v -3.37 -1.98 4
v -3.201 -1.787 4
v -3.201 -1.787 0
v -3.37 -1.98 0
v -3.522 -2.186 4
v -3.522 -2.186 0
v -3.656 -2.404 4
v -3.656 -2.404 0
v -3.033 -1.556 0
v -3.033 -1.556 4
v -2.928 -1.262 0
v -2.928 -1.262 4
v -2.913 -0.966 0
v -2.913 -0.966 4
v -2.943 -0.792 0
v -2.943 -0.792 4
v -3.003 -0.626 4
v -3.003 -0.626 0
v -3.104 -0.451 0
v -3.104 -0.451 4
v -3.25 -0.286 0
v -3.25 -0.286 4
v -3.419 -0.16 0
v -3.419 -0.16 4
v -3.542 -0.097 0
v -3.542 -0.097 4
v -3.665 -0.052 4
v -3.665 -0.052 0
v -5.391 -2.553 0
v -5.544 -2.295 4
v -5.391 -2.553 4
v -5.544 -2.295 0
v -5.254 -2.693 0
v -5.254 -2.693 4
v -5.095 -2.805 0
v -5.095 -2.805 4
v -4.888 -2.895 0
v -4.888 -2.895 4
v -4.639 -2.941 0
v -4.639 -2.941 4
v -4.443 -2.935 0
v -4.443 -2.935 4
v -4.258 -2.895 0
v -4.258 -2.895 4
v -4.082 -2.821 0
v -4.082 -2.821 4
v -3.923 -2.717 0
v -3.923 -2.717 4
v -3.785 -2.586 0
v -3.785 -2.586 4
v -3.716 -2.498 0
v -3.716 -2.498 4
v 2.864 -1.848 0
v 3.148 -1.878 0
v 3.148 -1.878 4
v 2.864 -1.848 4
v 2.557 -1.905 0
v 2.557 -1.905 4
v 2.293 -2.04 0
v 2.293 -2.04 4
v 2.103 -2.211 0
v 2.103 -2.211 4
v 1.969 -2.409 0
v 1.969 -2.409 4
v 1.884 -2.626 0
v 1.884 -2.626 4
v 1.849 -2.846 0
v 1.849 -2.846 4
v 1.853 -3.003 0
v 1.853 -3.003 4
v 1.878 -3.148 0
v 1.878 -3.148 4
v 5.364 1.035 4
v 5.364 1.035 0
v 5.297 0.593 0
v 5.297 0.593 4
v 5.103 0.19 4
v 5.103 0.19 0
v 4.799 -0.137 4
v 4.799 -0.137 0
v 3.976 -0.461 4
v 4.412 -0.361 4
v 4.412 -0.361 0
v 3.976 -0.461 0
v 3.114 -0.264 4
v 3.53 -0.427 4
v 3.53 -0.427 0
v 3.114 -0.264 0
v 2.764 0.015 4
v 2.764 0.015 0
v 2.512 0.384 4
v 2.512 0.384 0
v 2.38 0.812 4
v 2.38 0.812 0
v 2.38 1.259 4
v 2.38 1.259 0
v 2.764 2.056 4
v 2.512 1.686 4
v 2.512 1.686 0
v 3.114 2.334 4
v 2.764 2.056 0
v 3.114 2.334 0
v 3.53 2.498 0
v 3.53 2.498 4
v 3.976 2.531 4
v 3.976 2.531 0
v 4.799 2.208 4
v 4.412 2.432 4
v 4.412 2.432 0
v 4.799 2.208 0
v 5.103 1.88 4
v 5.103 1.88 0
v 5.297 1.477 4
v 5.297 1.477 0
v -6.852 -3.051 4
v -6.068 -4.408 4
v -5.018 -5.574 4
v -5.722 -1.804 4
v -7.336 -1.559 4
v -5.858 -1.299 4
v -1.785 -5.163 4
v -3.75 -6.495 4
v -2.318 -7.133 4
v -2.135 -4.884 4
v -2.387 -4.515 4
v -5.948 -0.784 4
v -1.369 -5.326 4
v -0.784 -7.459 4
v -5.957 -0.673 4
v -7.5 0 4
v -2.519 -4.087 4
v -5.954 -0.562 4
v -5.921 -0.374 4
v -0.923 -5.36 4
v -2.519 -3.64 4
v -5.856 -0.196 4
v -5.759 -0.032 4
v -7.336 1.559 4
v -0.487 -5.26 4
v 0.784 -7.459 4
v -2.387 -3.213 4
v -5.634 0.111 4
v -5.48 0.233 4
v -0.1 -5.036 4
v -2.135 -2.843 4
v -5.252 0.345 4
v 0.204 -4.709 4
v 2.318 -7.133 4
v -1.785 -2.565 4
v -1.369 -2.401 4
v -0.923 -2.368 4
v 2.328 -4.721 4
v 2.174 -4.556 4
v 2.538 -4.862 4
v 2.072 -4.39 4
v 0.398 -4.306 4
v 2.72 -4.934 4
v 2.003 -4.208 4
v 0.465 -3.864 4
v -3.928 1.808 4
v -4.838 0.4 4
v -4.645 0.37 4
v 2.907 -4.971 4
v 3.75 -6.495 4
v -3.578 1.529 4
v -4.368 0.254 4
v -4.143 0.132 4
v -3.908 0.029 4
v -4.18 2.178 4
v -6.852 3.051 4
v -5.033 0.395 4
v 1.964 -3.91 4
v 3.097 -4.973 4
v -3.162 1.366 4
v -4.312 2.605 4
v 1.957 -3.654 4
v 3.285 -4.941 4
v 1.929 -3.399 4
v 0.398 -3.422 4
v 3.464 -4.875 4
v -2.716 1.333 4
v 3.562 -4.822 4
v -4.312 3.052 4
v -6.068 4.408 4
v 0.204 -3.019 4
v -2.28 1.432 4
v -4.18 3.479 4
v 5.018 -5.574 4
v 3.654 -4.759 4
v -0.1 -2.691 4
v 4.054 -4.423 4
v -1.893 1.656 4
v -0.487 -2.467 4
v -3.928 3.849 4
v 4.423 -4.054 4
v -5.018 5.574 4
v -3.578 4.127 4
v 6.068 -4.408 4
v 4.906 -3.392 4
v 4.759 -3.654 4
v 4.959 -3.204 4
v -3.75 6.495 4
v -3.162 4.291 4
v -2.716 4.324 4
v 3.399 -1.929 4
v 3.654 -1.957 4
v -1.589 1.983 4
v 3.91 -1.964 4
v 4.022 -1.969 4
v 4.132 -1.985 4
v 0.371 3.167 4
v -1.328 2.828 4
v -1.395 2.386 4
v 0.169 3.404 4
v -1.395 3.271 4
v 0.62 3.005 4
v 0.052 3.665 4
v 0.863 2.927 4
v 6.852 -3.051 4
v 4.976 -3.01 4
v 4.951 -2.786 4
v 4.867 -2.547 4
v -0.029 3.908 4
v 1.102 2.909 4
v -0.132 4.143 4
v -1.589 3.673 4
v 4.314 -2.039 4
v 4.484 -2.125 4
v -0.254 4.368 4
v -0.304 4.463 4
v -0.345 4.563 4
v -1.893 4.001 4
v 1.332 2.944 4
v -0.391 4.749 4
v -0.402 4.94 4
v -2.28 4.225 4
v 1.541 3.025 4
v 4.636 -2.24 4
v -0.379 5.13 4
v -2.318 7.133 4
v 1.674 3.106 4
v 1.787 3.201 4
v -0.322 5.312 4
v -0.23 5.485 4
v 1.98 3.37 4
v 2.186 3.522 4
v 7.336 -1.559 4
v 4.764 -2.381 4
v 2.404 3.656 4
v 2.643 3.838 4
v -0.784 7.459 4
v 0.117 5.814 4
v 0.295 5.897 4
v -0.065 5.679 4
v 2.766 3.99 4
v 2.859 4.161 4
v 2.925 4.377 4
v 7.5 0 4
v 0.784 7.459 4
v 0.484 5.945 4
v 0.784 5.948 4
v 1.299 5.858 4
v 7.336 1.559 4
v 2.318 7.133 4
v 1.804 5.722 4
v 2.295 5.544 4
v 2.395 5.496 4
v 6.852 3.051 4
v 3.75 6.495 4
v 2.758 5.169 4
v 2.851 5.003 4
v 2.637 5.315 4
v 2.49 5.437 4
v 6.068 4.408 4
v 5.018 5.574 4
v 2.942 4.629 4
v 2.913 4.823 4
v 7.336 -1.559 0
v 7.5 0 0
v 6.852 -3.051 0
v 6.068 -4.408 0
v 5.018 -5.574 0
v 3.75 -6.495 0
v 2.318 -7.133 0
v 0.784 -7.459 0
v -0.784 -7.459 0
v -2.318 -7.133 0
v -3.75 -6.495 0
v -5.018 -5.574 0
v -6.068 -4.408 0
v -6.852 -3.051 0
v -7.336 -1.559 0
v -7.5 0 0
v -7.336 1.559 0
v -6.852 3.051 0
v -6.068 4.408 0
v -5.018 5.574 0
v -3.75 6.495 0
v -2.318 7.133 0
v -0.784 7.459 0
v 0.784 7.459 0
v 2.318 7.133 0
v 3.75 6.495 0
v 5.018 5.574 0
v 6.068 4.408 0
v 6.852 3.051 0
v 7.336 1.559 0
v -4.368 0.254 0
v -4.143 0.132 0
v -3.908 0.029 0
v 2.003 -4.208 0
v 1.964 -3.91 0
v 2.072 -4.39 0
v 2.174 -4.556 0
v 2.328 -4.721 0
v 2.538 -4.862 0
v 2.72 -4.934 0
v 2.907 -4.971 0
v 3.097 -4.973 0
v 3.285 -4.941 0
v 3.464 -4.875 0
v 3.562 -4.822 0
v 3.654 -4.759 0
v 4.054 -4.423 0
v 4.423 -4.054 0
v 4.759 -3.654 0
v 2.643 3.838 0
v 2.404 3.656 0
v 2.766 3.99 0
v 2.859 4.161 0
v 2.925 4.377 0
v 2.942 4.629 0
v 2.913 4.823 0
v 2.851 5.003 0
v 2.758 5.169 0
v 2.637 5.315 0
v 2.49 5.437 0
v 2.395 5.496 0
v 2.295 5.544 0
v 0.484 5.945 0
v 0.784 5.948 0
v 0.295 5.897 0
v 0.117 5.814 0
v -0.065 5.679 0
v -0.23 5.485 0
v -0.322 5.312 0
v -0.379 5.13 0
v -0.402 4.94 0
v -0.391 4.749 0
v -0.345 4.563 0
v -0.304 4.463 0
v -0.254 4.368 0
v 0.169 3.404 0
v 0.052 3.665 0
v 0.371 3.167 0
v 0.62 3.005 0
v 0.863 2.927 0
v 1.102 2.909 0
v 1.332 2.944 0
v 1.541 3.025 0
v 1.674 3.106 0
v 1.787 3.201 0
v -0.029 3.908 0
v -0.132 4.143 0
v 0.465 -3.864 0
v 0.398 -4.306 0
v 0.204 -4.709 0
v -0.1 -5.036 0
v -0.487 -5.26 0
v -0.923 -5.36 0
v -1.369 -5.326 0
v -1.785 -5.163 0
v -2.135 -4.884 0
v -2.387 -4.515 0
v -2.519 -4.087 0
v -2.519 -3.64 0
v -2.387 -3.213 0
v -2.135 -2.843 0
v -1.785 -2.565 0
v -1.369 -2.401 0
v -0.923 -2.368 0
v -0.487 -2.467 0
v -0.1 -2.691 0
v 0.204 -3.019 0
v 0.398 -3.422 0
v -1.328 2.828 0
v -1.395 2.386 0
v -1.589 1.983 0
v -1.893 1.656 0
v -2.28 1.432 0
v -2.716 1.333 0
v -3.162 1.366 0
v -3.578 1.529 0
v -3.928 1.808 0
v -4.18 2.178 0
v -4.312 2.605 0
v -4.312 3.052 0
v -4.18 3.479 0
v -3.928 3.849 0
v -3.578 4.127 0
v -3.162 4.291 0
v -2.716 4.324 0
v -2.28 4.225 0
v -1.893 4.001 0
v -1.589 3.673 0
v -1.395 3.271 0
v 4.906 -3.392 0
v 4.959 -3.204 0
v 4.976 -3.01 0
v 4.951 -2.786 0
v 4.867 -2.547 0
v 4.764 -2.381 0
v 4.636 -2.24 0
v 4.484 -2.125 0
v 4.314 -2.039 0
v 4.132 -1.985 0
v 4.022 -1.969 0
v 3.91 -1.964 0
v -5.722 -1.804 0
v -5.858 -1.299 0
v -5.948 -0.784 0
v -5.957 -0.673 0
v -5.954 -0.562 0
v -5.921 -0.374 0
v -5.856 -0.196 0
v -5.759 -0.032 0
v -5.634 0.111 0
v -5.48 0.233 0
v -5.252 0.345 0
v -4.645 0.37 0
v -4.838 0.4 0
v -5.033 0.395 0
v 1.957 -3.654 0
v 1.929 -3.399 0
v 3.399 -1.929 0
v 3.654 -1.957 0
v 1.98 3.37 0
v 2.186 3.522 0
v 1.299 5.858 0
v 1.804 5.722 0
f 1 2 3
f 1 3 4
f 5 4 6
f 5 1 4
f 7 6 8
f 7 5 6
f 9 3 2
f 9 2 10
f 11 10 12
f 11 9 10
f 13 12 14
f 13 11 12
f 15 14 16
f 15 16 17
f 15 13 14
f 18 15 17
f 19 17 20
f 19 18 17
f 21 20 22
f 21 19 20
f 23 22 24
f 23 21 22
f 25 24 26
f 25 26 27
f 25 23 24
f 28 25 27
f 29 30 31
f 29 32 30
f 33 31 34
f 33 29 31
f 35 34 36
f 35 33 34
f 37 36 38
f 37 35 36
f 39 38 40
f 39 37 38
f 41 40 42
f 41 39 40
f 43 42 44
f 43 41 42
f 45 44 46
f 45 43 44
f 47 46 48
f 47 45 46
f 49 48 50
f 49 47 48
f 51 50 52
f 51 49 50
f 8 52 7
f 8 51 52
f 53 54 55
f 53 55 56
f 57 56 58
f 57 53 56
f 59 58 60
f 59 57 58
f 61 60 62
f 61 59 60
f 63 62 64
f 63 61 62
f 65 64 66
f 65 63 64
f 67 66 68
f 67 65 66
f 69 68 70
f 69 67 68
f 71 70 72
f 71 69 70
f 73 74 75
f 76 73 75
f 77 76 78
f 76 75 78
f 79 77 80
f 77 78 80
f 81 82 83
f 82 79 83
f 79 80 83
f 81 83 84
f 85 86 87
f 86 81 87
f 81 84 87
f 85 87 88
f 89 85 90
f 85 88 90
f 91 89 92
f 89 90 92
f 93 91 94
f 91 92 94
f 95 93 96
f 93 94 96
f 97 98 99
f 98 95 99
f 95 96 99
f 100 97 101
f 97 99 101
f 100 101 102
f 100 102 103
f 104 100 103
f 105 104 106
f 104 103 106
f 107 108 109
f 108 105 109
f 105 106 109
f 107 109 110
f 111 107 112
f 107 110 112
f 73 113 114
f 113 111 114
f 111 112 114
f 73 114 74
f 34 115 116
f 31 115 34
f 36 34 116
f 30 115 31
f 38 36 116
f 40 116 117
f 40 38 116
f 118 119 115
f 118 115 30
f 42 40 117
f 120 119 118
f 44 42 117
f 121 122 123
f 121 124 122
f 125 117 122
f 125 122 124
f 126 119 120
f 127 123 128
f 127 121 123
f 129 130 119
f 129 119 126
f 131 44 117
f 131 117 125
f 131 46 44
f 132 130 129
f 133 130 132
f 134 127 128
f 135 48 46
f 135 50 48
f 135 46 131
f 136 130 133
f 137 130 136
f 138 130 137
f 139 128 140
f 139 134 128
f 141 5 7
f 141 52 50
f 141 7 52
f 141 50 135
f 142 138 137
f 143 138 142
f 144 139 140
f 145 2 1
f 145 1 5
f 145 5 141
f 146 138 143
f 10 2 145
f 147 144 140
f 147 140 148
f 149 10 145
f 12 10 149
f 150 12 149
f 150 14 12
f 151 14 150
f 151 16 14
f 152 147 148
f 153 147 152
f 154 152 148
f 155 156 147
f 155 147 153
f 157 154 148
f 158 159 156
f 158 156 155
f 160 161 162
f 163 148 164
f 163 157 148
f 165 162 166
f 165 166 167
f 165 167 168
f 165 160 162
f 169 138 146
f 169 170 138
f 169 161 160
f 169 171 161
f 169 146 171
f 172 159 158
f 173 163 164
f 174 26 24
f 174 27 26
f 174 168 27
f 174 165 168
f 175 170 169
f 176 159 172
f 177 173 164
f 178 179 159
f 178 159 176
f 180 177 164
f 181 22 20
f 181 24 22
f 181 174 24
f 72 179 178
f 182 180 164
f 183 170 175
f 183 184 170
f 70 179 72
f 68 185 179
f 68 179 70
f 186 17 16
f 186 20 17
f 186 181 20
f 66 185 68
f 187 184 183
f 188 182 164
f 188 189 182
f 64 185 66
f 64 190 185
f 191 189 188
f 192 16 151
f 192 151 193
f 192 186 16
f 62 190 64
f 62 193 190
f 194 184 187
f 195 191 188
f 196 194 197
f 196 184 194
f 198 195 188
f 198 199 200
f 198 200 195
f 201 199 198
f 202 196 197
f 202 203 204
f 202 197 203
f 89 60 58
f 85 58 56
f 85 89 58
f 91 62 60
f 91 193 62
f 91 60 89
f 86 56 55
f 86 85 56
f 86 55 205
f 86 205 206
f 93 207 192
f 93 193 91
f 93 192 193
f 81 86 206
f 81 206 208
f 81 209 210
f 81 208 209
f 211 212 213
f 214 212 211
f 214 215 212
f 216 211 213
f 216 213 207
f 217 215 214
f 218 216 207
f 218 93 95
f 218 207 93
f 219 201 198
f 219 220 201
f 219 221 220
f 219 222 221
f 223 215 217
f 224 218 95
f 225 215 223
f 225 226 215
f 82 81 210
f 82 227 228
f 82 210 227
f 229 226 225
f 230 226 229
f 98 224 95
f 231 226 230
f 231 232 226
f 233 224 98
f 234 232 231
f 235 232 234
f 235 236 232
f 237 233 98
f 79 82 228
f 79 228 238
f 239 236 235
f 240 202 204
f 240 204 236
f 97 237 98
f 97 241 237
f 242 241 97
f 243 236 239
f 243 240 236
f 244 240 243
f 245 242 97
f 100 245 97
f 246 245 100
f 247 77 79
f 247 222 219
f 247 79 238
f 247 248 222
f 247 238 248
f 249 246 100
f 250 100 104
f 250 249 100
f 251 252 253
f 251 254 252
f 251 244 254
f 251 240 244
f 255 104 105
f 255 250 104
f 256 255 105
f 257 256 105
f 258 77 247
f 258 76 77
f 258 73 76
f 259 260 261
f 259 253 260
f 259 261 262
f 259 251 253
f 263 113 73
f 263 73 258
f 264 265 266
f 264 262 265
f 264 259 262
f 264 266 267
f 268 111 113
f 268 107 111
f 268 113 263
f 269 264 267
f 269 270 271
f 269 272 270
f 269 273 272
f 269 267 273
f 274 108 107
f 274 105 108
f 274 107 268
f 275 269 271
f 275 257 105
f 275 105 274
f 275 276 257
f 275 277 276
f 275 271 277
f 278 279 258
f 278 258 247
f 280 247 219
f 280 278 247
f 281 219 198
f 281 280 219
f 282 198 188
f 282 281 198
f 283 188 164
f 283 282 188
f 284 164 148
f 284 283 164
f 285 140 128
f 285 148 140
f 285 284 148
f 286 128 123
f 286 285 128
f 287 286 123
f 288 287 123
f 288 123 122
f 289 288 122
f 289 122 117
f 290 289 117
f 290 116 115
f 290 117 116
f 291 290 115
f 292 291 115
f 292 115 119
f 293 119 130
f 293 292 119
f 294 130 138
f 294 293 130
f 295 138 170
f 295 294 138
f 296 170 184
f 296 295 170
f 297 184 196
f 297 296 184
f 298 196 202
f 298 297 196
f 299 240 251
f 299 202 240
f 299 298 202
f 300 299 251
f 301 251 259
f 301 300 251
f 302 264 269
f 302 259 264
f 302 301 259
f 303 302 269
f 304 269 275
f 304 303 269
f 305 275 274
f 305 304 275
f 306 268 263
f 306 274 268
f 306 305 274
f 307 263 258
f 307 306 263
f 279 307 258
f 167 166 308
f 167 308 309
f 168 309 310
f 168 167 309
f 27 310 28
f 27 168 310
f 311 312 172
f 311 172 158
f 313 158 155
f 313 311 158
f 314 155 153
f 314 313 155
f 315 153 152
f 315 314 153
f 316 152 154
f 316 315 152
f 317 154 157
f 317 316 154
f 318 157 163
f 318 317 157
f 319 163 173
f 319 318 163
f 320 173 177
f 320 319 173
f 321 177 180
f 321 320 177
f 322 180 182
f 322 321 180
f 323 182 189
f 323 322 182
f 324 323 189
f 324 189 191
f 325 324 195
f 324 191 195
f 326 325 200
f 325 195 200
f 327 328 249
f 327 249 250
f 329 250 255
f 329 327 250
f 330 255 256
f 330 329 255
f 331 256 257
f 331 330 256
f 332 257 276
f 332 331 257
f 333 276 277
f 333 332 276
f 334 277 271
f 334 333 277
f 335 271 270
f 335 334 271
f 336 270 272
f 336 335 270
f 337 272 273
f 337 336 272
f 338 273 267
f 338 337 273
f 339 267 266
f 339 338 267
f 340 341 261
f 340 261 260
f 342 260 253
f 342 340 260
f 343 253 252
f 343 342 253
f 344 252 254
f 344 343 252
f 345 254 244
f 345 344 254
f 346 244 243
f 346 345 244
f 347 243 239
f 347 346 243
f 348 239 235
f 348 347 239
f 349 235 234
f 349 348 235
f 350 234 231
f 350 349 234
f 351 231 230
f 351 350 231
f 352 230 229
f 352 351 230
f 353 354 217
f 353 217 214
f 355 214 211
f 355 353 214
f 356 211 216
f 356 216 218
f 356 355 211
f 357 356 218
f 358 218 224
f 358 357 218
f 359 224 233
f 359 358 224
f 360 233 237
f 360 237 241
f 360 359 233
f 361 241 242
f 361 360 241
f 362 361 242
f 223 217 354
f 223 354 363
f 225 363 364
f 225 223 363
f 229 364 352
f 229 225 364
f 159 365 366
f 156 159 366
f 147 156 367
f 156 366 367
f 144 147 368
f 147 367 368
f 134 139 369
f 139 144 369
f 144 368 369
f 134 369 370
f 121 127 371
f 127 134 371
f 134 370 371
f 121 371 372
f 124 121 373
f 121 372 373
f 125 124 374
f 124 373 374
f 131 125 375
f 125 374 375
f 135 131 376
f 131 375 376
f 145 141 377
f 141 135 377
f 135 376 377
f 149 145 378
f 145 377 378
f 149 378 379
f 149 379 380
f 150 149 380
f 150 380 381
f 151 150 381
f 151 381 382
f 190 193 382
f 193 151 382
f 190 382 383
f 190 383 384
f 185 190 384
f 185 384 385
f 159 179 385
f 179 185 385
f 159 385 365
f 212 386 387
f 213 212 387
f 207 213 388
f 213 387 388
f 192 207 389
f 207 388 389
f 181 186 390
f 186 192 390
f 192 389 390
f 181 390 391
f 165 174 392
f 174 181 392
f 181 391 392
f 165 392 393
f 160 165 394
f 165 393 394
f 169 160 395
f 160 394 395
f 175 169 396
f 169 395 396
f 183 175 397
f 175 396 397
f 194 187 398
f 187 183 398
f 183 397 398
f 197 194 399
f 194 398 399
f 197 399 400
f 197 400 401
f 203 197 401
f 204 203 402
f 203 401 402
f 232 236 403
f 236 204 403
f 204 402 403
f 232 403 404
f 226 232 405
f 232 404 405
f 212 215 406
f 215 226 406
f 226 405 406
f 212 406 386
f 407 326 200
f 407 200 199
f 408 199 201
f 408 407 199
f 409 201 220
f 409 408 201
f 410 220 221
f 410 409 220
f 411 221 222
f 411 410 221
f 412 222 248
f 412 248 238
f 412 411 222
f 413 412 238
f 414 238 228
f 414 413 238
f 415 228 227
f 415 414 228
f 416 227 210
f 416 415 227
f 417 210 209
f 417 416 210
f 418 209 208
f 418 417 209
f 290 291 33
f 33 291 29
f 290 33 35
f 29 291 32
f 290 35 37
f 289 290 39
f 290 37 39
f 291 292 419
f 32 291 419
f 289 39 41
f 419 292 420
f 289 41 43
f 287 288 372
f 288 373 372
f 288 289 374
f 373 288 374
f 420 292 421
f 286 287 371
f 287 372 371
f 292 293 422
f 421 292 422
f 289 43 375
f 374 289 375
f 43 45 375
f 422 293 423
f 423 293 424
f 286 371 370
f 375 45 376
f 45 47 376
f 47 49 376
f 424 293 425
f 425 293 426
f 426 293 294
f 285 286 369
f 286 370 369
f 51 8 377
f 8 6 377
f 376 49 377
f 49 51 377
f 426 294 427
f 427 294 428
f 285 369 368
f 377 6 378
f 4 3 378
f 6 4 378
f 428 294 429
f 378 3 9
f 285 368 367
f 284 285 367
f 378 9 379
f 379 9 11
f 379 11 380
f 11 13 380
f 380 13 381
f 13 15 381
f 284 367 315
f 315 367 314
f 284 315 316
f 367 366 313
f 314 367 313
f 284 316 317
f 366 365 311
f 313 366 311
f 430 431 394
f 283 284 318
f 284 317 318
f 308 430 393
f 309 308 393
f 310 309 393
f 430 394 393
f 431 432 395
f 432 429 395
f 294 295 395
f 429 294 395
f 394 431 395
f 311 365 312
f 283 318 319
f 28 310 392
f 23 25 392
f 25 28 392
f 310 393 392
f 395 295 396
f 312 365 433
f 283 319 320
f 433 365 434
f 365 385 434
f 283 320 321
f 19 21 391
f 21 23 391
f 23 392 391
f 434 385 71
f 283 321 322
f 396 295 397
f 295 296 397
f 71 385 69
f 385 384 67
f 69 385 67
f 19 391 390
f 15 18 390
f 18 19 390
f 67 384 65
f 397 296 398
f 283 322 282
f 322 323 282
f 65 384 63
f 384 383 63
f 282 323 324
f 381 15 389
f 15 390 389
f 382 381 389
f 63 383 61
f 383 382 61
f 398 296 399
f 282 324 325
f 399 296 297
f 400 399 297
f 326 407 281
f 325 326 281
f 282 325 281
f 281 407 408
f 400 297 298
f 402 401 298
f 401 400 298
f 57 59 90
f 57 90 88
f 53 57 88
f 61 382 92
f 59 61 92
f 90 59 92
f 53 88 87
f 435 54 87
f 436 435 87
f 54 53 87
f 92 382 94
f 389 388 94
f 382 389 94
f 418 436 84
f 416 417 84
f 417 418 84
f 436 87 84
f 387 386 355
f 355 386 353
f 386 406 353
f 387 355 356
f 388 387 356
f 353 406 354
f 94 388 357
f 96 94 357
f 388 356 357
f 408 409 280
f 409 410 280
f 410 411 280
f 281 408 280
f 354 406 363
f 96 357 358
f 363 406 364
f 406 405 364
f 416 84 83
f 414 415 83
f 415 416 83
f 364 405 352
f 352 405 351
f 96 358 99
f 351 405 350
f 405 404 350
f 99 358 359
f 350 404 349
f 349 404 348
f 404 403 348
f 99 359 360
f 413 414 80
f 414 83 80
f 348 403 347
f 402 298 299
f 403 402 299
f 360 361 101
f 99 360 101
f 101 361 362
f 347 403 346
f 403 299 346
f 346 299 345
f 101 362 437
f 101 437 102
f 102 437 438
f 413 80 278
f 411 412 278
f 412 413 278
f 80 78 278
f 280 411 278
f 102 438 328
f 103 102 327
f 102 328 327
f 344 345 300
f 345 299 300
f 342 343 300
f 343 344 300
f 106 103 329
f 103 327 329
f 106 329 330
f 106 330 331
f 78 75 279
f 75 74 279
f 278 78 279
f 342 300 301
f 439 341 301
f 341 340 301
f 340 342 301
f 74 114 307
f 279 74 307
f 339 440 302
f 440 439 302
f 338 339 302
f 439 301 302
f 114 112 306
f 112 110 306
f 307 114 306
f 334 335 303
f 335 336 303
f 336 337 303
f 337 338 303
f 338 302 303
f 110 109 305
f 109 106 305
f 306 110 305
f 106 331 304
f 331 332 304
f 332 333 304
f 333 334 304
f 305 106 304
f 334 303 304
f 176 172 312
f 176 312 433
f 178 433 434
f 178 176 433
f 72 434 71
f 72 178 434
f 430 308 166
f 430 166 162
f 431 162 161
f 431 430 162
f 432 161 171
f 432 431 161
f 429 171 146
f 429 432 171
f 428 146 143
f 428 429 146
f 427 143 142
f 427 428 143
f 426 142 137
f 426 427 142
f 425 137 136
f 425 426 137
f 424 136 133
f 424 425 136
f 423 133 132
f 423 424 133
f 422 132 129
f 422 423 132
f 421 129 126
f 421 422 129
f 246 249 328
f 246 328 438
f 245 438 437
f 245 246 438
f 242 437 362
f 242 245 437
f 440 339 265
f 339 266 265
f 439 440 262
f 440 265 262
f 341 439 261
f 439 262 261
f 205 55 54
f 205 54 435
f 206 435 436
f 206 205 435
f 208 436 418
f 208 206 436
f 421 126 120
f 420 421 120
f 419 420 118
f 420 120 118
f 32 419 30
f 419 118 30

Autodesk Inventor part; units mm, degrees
ref_plane "YZ Plane" through (0, 0, 0) normal (1, 0, 0) x (0, 1, 0)
ref_plane "XZ Plane" through (0, 0, 0) normal (0, 1, 0) x (-1, 0, 0)
ref_plane "XY Plane" through (0, 0, 0) normal (0, 0, 1) x (1, 0, 0)
sketch "スケッチ1" plane through (0, 0, 0) normal (0, 0, 1) x (1, 0, 0)
  circle A0 centre (0, 0) radius 6.975
  circle A1 centre (-2.8284, 2.8284) radius 1.5
  circle A2 centre (-1.0353, -3.8637) radius 1.5
  circle A3 centre (3.8637, 1.0353) radius 1.5
  circle A4 centre (0, 0) radius 7.5
  dimension "d0" = 13.95
  dimension "d1" = 3
  dimension "d2" = 4
  dimension "d5" = 360
  dimension "d9" = 15
extrude "押し出し2" add sketch "スケッチ1" along normal blind 4 contours A0 | A4
sketch "スケッチ2" plane through (0, 0, 4) normal (0, 0, 1) x (1, 0, 0)
  circle A0 centre (0, 0) radius 7.5 projected
  circle A1 centre (-1.0353, -3.8637) radius 1.5 projected
  circle A2 centre (-2.8284, 2.8284) radius 1.5 projected
  circle A3 centre (3.8637, 1.0353) radius 1.5 projected
  circle A4 centre (0, 0) radius 3
  circle A5 centre (0, 0) radius 6
  circle A6 centre (-2.8284, 2.8284) radius 3
  circle A7 centre (-1.0353, -3.8637) radius 3
  circle A8 centre (3.8637, 1.0353) radius 3
  point P0 (5.882, -1.1843)
  point P1 (2.5106, -1.6422)
  point P2 (1.6422, -2.5106)
  point P3 (1.1843, -5.882)
  point P4 (1.3531, 2.6775)
  point P5 (4.5018, 3.9666)
  point P6 (-1.9153, 5.6861)
  point P7 (0.1669, 2.9954)
  point P8 (-3.9666, -4.5018)
  point P9 (-2.6775, -1.3531)
  point P10 (-2.9954, -0.1669)
  point P11 (-5.6861, 1.9153)
  dimension "d13" = 6
  dimension "d14" = 1.5
  dimension "d15" = 1.5
  dimension "d16" = 1.5
  dimension "d17" = 1.5
extrude "押し出し3" cut sketch "スケッチ2" against normal blind 10 contours A4 A8 A5 A7 | A7 A5 A6 A4 | A4 A6 A5 A8
fillet "フィレット1" radius 1.05 12 edges at (-1.9153, 5.6861, 2) (4.5018, 3.9666, 2) (0.1669, 2.9954, 2) (1.3531, 2.6775, 2) (-5.6861, 1.9153, 2) (-2.9954, -0.1669, 2) (-2.6775, -1.3531, 2) (-3.9666, -4.5018, 2) (2.5106, -1.6422, 2) (1.6422, -2.5106, 2) (5.882, -1.1843, 2) (1.1843, -5.882, 2)
properties part number "アームカムD15t4" material "アセタール樹脂、白"
